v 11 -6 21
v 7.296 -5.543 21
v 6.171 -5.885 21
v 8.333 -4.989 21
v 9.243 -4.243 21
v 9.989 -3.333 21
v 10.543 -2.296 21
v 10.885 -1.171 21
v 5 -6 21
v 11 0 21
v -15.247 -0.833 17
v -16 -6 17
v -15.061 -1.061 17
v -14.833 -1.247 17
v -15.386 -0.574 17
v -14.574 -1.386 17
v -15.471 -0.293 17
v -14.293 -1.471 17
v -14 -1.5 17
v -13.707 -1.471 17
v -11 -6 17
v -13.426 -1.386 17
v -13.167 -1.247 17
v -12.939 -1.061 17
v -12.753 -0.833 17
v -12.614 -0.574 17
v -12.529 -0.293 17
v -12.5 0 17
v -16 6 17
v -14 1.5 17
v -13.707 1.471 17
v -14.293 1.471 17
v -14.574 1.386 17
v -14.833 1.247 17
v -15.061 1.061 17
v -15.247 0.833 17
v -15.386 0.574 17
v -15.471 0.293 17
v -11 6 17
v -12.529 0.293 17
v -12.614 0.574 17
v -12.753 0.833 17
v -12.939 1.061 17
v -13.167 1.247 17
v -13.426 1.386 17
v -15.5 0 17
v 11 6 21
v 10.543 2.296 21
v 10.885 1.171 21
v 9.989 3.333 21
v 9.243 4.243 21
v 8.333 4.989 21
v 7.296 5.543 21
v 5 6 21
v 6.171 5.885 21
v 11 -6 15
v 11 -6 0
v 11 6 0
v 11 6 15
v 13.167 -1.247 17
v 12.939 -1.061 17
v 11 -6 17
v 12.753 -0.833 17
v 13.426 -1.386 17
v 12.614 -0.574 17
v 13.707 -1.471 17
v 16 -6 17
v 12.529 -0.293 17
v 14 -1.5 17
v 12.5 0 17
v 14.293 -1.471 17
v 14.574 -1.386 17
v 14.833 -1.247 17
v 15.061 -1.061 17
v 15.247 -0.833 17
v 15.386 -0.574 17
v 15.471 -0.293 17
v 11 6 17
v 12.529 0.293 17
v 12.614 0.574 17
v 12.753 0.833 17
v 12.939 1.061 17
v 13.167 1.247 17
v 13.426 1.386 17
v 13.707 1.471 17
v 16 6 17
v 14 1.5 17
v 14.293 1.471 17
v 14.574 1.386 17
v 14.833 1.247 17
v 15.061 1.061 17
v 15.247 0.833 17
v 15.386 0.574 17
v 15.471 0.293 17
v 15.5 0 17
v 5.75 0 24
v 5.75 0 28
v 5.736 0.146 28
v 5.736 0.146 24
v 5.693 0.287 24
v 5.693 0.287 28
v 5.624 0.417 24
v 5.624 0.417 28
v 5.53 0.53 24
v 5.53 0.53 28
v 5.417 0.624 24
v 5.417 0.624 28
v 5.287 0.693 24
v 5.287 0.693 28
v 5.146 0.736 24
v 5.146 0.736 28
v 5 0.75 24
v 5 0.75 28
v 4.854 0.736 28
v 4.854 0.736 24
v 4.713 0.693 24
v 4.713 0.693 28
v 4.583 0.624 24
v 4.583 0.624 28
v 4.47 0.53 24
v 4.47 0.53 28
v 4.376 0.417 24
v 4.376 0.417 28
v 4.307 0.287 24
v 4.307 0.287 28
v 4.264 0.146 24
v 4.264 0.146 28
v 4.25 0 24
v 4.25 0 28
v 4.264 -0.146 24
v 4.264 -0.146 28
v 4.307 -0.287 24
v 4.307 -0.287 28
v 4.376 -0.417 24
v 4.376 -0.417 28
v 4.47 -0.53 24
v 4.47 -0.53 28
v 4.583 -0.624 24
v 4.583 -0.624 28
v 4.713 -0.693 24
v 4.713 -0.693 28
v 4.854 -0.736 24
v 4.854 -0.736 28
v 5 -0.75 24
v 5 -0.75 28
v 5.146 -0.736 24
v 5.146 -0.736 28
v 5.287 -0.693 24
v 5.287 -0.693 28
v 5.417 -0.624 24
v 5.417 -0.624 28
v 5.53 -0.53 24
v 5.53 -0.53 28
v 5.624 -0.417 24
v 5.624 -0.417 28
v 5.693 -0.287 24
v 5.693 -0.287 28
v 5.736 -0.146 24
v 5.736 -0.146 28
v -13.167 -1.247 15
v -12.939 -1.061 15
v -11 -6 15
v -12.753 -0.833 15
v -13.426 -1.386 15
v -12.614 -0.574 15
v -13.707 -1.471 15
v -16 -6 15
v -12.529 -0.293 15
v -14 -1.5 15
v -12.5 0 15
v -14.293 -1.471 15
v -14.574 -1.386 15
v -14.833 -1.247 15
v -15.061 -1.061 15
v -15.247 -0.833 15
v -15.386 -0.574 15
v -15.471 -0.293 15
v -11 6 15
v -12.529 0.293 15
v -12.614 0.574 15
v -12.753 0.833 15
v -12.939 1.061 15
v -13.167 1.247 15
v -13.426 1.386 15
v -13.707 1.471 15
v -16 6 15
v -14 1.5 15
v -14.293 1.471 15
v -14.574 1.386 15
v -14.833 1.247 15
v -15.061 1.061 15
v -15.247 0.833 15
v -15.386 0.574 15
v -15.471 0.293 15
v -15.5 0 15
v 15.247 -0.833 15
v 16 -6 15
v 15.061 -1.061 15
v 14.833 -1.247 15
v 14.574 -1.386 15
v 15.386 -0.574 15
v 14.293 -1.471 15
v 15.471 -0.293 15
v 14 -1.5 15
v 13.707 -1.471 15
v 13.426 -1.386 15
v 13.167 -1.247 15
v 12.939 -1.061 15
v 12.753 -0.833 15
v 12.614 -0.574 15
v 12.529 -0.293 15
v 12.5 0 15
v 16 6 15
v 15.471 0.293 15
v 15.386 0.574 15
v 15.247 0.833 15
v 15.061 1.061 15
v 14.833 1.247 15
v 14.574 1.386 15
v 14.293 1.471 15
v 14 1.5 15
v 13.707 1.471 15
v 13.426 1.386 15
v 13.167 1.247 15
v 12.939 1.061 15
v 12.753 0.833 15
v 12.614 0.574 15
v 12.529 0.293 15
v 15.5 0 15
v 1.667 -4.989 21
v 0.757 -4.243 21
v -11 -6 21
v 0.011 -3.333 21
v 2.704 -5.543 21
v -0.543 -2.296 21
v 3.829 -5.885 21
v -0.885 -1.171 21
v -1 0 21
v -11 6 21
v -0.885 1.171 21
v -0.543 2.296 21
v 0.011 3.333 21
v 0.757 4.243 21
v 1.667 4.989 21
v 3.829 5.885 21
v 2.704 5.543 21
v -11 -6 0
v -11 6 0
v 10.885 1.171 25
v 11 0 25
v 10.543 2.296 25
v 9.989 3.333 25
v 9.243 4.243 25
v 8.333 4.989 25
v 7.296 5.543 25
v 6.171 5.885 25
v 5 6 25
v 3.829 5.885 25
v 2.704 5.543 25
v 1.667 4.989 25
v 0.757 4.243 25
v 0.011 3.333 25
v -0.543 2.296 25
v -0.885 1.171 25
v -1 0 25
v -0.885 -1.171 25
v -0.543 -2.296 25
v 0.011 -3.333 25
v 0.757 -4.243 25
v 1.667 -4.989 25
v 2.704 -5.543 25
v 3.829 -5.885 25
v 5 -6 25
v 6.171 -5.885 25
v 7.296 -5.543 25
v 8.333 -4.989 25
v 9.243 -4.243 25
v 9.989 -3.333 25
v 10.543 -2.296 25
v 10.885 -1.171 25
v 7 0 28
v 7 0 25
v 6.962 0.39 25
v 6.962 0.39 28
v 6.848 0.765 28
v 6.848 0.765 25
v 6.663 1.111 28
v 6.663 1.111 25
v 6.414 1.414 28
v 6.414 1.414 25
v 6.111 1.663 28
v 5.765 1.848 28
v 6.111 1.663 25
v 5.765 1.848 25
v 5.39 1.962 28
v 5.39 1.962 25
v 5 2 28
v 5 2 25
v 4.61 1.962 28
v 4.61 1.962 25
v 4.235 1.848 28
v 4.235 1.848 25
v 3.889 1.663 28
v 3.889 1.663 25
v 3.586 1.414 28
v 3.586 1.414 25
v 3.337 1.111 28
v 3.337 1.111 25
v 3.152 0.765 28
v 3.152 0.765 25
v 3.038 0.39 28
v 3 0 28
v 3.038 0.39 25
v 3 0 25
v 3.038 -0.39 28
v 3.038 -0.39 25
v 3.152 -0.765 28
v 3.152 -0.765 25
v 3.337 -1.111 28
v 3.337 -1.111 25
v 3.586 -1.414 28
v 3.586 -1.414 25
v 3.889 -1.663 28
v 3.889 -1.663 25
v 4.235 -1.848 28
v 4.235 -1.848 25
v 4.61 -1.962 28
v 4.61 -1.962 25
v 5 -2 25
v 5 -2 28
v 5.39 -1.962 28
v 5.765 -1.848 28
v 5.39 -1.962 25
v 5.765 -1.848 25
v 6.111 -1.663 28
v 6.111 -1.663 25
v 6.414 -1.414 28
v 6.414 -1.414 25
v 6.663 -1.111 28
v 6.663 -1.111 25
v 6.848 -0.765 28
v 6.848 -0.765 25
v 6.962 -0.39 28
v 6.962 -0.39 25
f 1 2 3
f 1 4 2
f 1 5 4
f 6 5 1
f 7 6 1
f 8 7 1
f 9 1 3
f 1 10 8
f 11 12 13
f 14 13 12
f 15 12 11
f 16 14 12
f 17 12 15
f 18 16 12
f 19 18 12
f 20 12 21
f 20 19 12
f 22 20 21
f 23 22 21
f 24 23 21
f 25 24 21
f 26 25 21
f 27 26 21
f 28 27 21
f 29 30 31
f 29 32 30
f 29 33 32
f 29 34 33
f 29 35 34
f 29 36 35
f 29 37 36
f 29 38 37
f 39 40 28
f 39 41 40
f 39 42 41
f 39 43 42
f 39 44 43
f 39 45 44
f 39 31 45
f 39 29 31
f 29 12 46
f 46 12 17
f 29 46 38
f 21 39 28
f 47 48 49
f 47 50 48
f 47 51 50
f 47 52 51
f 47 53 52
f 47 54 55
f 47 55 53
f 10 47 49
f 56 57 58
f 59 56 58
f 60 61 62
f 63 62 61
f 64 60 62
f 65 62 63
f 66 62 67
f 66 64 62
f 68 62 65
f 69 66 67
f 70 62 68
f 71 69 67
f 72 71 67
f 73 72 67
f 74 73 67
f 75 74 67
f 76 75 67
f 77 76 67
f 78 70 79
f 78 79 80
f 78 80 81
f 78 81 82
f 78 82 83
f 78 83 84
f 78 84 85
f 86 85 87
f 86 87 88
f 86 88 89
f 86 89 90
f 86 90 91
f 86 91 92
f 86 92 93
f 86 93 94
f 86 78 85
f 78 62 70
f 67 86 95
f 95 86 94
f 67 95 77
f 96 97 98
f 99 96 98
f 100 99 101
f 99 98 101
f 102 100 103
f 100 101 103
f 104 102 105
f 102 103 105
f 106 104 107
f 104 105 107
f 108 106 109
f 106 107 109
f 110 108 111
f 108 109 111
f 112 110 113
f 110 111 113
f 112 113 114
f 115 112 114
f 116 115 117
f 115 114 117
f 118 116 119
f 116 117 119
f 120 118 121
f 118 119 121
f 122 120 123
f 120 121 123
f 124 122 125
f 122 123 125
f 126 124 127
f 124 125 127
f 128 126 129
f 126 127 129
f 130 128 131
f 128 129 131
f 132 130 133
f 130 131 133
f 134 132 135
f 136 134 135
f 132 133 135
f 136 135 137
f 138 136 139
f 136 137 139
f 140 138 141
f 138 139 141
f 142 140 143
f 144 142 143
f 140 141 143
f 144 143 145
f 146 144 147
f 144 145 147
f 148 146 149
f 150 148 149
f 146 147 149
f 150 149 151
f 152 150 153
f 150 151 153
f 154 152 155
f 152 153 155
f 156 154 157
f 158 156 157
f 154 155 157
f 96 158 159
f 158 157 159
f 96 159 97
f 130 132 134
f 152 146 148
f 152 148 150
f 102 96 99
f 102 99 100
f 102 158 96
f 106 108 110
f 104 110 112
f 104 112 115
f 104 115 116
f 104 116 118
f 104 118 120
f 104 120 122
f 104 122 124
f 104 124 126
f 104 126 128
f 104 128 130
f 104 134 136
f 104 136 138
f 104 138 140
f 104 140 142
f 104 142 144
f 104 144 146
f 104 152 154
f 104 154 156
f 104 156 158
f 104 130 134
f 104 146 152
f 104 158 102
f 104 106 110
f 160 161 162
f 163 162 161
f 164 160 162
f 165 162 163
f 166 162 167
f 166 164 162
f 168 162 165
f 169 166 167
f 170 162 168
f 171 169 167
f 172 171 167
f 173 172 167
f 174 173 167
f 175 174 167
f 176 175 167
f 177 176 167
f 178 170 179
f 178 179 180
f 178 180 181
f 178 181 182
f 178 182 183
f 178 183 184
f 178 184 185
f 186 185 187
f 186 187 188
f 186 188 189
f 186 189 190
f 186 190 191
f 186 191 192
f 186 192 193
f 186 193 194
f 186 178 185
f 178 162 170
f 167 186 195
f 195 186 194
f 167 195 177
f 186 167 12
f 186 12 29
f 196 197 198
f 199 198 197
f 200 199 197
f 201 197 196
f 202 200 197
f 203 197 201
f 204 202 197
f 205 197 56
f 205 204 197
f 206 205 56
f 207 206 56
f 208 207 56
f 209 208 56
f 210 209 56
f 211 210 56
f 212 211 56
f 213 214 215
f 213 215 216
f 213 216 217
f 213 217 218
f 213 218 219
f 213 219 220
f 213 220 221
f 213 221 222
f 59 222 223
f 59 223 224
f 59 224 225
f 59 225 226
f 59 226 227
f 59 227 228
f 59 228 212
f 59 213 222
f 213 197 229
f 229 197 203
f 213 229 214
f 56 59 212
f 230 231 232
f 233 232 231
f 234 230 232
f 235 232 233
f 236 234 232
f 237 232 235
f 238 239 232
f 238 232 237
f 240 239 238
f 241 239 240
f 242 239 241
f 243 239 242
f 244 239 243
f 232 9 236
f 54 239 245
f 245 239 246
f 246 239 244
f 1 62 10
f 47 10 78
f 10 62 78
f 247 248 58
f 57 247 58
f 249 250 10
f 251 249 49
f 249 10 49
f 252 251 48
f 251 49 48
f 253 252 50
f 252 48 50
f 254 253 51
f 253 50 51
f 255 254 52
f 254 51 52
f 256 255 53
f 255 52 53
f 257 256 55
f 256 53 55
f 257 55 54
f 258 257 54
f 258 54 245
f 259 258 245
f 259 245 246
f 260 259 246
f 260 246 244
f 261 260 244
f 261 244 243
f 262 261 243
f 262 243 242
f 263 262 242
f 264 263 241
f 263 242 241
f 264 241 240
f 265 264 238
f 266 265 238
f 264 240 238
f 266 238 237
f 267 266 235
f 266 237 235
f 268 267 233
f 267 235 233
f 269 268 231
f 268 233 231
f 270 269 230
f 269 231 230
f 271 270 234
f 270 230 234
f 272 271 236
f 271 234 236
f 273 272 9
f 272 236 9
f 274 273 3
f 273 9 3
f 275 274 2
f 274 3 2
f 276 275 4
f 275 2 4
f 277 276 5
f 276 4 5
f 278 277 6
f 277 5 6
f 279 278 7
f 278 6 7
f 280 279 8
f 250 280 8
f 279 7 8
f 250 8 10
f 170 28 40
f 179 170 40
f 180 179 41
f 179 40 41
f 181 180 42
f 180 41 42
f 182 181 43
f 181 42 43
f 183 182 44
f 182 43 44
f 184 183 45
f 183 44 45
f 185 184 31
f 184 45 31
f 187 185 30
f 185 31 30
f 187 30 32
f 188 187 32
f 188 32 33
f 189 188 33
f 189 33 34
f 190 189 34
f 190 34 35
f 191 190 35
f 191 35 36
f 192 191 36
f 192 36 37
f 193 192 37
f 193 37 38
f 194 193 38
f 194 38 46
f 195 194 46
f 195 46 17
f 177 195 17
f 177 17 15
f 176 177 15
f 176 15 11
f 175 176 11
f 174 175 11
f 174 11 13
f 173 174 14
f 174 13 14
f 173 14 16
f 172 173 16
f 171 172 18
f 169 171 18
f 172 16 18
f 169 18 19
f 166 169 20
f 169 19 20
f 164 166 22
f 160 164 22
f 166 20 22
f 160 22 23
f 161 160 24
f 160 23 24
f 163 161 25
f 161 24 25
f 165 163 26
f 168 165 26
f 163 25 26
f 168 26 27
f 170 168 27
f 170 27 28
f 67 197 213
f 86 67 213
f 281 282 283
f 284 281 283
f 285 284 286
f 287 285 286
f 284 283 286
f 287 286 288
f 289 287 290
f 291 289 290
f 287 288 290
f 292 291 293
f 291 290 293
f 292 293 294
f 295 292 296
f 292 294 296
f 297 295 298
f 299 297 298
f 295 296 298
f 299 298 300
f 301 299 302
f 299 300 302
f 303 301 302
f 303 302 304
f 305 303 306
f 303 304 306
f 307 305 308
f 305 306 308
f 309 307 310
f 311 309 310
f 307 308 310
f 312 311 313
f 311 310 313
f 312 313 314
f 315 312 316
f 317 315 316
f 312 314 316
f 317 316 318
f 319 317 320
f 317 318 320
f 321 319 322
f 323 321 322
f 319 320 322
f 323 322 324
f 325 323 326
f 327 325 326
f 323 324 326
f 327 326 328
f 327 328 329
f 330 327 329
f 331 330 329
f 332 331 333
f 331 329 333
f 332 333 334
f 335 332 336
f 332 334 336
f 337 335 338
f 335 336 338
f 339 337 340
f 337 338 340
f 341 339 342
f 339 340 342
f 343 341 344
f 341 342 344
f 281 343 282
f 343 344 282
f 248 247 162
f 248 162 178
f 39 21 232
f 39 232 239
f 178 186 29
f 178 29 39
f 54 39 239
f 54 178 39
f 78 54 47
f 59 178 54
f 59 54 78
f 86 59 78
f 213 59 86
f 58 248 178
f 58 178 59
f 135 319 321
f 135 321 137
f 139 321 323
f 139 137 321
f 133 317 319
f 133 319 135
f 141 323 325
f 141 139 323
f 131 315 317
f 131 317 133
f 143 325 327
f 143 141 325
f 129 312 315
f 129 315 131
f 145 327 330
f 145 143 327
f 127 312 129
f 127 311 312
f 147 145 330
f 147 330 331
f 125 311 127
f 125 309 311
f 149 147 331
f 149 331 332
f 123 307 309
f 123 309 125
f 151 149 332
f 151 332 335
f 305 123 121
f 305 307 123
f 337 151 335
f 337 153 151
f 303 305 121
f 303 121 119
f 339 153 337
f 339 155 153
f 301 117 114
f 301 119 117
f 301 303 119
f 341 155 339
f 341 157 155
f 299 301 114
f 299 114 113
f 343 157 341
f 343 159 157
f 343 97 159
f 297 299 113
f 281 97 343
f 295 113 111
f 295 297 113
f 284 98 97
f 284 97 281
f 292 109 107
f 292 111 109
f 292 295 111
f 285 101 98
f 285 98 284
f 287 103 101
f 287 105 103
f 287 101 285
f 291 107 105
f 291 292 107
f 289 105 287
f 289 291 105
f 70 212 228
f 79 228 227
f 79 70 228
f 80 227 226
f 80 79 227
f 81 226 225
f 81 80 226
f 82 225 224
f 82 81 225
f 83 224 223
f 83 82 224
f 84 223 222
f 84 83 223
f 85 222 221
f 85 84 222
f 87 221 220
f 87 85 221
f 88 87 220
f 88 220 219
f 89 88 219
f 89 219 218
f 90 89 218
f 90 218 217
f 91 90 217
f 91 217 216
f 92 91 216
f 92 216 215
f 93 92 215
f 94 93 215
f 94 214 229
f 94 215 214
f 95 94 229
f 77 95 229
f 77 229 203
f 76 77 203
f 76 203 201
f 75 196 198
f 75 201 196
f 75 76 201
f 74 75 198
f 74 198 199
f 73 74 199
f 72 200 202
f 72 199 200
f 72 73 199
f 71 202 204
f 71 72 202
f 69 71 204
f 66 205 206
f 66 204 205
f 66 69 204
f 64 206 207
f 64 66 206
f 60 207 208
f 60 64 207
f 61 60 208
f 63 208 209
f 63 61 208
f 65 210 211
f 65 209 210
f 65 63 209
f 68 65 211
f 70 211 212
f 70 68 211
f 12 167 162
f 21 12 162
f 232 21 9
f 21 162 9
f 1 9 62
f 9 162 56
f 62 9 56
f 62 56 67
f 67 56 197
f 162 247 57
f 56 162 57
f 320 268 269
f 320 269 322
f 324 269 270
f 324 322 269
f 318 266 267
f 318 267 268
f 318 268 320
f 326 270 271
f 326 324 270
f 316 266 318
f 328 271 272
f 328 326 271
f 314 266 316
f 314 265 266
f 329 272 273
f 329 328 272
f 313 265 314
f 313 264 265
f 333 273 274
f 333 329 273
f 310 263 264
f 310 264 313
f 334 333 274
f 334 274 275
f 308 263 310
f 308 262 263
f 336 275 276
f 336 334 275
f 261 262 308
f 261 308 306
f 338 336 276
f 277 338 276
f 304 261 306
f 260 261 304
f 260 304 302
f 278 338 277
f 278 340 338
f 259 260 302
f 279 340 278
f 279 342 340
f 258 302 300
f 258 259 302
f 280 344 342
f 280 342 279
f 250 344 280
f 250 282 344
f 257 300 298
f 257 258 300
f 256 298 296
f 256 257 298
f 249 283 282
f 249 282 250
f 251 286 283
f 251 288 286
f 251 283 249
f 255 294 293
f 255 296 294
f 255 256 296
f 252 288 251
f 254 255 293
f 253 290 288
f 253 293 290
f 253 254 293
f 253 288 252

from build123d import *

# Parameters (mm, degrees)
CROQUIS1_W              = 32
CROQUIS1_H              = 12
SALIENTE_EXTRUIR1_DEPTH = 30
CROQUIS2_W              = 5
CROQUIS2_H              = 12
CORTAR_EXTRUIR1_DEPTH   = 15
CROQUIS3_W              = 32
CROQUIS3_H              = 12
CORTAR_EXTRUIR3_DEPTH   = 13
CROQUIS4_W              = 22
CROQUIS4_H              = 12
SALIENTE_EXTRUIR2_DEPTH = 4
CROQUIS5_R              = 6
SALIENTE_EXTRUIR3_DEPTH = 4
CROQUIS6_R              = 2
SALIENTE_EXTRUIR4_DEPTH = 3
CROQUIS7_R              = 0.75
CORTAR_EXTRUIR4_DEPTH   = 4
CROQUIS8_R              = 1.5
CORTAR_EXTRUIR5_DEPTH   = 4


with BuildPart() as part:
    # Croquis1 → Saliente-Extruir1 (new body)
    with BuildSketch(Plane.XY):
        Rectangle(CROQUIS1_W, CROQUIS1_H)
    extrude(amount=SALIENTE_EXTRUIR1_DEPTH)

    # Croquis2 → Cortar-Extruir1 (cut)
    with BuildSketch(Plane(origin=(0, 0, 0), x_dir=(-1, 0, 0), z_dir=(0, 0, -1))):
        with Locations((-13.5, 0)):
            Rectangle(CROQUIS2_W, CROQUIS2_H)
        with Locations((13.5, 0)):
            Rectangle(CROQUIS2_W, CROQUIS2_H)
    extrude(amount=-CORTAR_EXTRUIR1_DEPTH, mode=Mode.SUBTRACT)

    # Croquis3 → Cortar-Extruir3 (cut)
    with BuildSketch(Plane.XY.offset(30)):
        Rectangle(CROQUIS3_W, CROQUIS3_H)
    extrude(amount=-CORTAR_EXTRUIR3_DEPTH, mode=Mode.SUBTRACT)

    # Croquis4 → Saliente-Extruir2 (add)
    with BuildSketch(Plane.XY.offset(17)):
        Rectangle(CROQUIS4_W, CROQUIS4_H)
    extrude(amount=SALIENTE_EXTRUIR2_DEPTH)

    # Croquis5 → Saliente-Extruir3 (add)
    with BuildSketch(Plane.XY.offset(21)):
        with Locations((5, 0)):
            Circle(CROQUIS5_R)
    extrude(amount=SALIENTE_EXTRUIR3_DEPTH)

    # Croquis6 → Saliente-Extruir4 (add)
    with BuildSketch(Plane.XY.offset(25)):
        with Locations((5, 0)):
            Circle(CROQUIS6_R)
    extrude(amount=SALIENTE_EXTRUIR4_DEPTH)

    # Croquis7 → Cortar-Extruir4 (cut)
    with BuildSketch(Plane.XY.offset(28)):
        with Locations((5, 0)):
            Circle(CROQUIS7_R)
    extrude(amount=-CORTAR_EXTRUIR4_DEPTH, mode=Mode.SUBTRACT)

    # Croquis8 → Cortar-Extruir5 (cut)
    with BuildSketch(Plane.XY.offset(17)):
        with Locations((-14, 0)):
            Circle(CROQUIS8_R)
    cortar_extruir5 = extrude(amount=-CORTAR_EXTRUIR5_DEPTH, mode=Mode.SUBTRACT)

    # Simetría1: Cortar-Extruir5 across plane
    add(cortar_extruir5.mirror(Plane(origin=(0, 0, 0), x_dir=(0, 0, 1), z_dir=(1, 0, 0))), mode=Mode.SUBTRACT)


solid = part.part
